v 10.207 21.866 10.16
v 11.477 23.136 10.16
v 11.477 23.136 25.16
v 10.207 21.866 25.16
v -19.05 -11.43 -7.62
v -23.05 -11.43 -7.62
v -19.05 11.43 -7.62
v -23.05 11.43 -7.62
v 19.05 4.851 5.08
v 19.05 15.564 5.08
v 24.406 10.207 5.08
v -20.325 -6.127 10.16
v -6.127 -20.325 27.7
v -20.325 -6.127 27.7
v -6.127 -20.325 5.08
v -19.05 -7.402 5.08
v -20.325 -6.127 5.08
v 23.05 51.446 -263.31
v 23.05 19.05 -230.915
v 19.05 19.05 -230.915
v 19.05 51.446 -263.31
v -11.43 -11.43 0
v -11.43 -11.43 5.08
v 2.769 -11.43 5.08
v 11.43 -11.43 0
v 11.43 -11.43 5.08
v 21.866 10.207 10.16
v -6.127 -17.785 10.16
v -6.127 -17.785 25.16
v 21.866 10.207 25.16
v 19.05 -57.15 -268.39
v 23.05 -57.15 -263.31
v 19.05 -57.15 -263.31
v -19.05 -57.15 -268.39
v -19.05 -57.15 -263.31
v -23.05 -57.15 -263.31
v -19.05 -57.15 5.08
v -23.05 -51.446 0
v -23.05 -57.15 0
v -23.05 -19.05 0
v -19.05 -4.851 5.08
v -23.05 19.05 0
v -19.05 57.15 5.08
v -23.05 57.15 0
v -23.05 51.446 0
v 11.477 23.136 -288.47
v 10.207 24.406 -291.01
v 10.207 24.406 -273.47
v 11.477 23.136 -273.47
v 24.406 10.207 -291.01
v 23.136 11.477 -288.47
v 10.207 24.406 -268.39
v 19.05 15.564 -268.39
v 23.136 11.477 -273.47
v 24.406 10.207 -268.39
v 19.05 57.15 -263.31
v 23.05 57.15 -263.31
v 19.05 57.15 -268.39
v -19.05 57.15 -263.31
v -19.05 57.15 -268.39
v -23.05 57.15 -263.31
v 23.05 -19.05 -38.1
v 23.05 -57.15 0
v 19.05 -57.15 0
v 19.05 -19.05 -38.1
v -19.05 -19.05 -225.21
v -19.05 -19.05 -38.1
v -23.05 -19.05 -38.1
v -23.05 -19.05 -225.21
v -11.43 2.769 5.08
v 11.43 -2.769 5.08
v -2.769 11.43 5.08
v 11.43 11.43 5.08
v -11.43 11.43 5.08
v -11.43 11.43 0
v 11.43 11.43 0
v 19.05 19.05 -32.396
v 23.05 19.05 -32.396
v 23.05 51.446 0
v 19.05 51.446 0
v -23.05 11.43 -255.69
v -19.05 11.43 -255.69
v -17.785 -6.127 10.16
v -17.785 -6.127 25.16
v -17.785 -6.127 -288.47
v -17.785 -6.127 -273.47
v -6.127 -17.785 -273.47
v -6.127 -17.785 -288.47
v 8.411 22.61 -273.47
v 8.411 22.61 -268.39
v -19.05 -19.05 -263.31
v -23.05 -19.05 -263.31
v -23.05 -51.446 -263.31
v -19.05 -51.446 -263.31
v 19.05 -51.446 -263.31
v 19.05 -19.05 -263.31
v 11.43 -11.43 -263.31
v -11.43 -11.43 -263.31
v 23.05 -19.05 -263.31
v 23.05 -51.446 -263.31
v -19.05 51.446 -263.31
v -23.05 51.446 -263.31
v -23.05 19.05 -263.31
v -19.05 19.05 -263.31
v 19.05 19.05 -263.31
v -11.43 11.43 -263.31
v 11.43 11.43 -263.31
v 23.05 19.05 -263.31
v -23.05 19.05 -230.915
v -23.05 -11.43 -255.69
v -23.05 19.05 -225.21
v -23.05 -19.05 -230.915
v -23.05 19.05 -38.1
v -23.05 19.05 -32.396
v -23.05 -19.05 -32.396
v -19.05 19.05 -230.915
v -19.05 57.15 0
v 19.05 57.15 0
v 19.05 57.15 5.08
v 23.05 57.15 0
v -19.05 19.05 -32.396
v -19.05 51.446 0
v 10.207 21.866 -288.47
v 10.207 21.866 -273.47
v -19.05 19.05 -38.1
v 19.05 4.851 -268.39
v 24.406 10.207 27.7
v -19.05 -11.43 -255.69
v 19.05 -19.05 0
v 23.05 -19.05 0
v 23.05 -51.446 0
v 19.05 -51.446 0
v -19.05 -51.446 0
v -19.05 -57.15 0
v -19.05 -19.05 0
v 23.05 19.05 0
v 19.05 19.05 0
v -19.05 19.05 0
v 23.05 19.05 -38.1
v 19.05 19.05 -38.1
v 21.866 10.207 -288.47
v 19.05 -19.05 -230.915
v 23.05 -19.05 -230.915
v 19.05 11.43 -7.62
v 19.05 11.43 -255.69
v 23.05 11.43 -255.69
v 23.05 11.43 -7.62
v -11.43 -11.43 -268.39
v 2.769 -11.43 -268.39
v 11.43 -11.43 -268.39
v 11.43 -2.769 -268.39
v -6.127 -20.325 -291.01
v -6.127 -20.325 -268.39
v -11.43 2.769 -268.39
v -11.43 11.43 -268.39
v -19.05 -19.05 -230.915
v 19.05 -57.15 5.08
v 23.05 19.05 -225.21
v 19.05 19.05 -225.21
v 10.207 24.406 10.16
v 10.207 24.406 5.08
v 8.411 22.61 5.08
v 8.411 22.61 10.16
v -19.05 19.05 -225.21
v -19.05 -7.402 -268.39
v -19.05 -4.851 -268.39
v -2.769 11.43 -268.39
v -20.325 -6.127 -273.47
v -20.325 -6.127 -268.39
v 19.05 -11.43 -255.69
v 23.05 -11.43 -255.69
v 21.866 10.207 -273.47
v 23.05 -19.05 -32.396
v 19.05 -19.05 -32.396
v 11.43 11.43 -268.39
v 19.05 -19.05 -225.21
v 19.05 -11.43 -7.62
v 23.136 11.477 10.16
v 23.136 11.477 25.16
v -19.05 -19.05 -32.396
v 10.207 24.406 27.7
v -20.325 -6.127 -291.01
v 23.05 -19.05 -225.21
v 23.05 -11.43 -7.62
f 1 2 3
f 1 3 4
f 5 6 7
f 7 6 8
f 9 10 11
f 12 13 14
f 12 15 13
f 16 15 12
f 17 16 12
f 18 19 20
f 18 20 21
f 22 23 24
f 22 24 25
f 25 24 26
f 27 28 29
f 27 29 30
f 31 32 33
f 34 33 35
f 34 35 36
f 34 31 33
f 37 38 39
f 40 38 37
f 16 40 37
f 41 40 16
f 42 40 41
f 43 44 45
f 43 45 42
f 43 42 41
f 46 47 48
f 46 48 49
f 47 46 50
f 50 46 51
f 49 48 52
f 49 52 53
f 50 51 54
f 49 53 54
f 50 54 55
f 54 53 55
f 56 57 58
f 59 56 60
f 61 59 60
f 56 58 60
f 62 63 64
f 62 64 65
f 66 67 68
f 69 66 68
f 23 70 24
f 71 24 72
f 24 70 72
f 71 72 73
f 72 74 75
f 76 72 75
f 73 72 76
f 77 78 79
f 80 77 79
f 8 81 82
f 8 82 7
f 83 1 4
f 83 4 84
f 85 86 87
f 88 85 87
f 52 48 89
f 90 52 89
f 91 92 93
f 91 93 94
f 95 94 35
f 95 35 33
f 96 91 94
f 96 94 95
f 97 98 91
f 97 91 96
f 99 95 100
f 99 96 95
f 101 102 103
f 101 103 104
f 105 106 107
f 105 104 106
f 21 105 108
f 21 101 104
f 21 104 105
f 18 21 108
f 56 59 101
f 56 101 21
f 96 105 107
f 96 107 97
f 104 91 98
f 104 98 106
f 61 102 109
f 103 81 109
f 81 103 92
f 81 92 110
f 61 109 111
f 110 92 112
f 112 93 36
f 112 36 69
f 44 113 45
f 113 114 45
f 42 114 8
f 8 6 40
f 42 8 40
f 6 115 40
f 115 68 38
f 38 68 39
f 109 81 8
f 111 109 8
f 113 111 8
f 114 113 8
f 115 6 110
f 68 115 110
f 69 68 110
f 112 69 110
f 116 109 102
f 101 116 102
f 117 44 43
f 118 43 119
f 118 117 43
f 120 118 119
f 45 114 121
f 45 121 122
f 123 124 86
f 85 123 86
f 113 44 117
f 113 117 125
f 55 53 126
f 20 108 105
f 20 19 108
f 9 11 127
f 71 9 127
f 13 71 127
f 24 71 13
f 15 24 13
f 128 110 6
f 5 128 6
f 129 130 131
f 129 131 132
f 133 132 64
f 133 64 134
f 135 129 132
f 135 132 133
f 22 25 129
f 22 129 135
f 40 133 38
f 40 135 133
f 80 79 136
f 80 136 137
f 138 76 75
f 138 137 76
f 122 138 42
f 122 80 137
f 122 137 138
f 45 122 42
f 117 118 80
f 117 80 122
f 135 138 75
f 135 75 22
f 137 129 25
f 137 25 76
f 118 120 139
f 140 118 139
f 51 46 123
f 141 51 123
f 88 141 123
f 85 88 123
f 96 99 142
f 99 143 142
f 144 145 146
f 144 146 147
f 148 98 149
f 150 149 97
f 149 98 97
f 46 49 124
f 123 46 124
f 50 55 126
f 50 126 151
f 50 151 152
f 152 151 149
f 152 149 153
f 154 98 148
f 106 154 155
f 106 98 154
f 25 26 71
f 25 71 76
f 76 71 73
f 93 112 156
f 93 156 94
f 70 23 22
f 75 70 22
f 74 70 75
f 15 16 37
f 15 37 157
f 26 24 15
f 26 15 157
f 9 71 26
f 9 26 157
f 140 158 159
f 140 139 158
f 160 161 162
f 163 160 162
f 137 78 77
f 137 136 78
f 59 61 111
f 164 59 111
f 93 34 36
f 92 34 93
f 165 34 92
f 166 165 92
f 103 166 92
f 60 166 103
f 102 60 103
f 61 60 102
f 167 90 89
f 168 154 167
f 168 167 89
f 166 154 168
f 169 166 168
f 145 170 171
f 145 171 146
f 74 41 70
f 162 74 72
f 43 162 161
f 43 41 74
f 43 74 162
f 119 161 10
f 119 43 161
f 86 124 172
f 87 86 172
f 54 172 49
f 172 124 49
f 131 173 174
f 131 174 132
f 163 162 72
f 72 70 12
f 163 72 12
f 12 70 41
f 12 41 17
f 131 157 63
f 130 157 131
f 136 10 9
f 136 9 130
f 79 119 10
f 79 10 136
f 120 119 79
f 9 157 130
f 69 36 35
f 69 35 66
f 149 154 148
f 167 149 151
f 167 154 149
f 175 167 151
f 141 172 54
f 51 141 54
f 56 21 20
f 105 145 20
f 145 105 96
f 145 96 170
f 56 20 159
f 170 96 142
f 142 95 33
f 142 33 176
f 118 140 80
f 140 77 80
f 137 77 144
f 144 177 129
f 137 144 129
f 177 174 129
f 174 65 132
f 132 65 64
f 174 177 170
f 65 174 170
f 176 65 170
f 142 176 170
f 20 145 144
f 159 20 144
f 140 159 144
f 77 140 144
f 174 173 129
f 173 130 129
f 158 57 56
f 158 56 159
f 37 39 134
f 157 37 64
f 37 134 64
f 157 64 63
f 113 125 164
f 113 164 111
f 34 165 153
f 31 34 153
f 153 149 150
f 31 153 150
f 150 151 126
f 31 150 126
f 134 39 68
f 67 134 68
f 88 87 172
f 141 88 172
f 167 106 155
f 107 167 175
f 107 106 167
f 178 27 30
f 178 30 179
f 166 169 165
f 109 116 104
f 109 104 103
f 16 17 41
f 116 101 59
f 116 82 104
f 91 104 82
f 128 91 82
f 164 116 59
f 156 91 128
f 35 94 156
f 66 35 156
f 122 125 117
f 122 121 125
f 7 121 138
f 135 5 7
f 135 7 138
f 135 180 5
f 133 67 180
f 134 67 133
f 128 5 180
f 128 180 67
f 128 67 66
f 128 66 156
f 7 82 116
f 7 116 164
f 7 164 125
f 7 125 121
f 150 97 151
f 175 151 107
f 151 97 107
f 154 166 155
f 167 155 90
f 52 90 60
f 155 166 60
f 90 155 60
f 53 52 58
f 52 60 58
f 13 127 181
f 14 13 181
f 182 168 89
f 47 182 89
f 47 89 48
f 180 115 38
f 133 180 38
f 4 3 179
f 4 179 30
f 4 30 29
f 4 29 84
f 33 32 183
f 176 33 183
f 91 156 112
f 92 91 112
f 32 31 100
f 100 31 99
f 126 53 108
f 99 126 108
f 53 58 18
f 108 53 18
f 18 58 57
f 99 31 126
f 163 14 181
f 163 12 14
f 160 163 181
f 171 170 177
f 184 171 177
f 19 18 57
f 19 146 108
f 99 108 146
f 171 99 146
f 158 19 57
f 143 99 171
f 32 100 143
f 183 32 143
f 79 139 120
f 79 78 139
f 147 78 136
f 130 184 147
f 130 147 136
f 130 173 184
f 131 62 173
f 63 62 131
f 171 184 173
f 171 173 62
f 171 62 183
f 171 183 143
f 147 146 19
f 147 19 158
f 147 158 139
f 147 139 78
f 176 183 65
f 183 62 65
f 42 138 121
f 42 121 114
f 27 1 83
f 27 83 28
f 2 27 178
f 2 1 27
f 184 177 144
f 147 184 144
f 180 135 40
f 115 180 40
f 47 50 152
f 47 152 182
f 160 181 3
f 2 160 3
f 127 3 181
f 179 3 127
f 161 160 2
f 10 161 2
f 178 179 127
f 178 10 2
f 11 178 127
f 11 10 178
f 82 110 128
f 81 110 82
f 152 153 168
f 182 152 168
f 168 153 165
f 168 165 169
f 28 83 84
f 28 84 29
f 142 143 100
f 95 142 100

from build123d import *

# Parameters (mm, degrees)
SKETCH1_W             = 38.1
SKETCH1_H             = 38.1
BOSS_EXTRUDE1_DEPTH   = 5.08
SKETCH2_W             = 4
SKETCH2_H             = 38.1
BOSS_EXTRUDE2_DEPTH   = 263.31036223
BOSS_EXTRUDE2_2_DEPTH = 263.31036223
BOSS_EXTRUDE4_DEPTH   = 38.1
SKETCH5_W             = 22.86
SKETCH5_H             = 22.86
CUT_EXTRUDE1_DEPTH    = 354.24236223
SKETCH6_W             = 248.07036223
SKETCH6_H             = 22.86
CUT_EXTRUDE2_DEPTH    = 354.24236223
BOSS_EXTRUDE5_DEPTH   = 38.1
BOSS_EXTRUDE6_DEPTH   = 4
MIRROR9_COPY_1_DEPTH  = 4
BOSS_EXTRUDE8_DEPTH   = 5.08
BOSS_EXTRUDE9_DEPTH   = 15
BOSS_EXTRUDE10_DEPTH  = 2.54


with BuildPart() as part:
    # Sketch1 → Boss-Extrude1 (new body)
    with BuildSketch(Plane.XY):
        Rectangle(SKETCH1_W, SKETCH1_H)
    extrude(amount=BOSS_EXTRUDE1_DEPTH)



with BuildPart() as body_2:
    # Sketch2 → Boss-Extrude2 (new body)
    with BuildSketch(Plane(origin=(0, 0, 0), x_dir=(-1, 0, 0), z_dir=(0, 0, -1))):
        with Locations((21.05, 0)):
            Rectangle(SKETCH2_W, SKETCH2_H)
    extrude(amount=BOSS_EXTRUDE2_DEPTH)


with BuildPart() as body_3:
    # Sketch2 → Boss-Extrude2 2 (new body)
    with BuildSketch(Plane(origin=(0, 0, 0), x_dir=(-1, 0, 0), z_dir=(0, 0, -1))):
        with Locations((-21.05, 0)):
            Rectangle(SKETCH2_W, SKETCH2_H)
    extrude(amount=BOSS_EXTRUDE2_2_DEPTH)


with BuildPart() as part_1:
    add(part.part)

    add(body_2.part)  # Boss-Extrude4 merges body 2

    add(body_3.part)  # Boss-Extrude4 merges body 3
    # Sketch4 → Boss-Extrude4 (add)
    with BuildSketch(Plane(origin=(0, 19.05, 0), x_dir=(1, 0, 0), z_dir=(0, 1, 0))):
        Polygon((23.05, 0), (19.05, -5.08), (19.05, 0), align=None)
        Polygon((-19.05, 0), (-19.05, -5.08), (-23.05, 0), align=None)
    extrude(amount=-BOSS_EXTRUDE4_DEPTH)

    # Mirror2: part across plane


with BuildPart() as part_2:
    add(part_1.part)
    add(part_1.part.mirror(Plane(origin=(0, 0, -131.655181115), x_dir=(1, 0, 0), z_dir=(0, 0, -1))))

    # Sketch5 → Cut-Extrude1 (cut)
    with BuildSketch(Plane.XY.offset(5.08)):
        Rectangle(SKETCH5_W, SKETCH5_H)
    extrude(amount=-CUT_EXTRUDE1_DEPTH, mode=Mode.SUBTRACT)

    # Sketch6 → Cut-Extrude2 (cut)
    with BuildSketch(Plane.ZY.offset(23.05)):
        with Locations((-131.655181115, 0)):
            Rectangle(SKETCH6_W, SKETCH6_H)
    extrude(amount=-CUT_EXTRUDE2_DEPTH, mode=Mode.SUBTRACT)

    # Sketch7 → Boss-Extrude5 (add)
    with BuildSketch(Plane(origin=(0, 19.05, 0), x_dir=(1, 0, 0), z_dir=(0, 1, 0))):
        Polygon((-19.05, 0), (-23.05, 0), (-19.05, -5.08), (19.05, -5.08), (23.05, 0), (19.05, 0), align=None)
        Polygon((19.05, 268.39036223), (23.05, 263.31036223), (19.05, 263.31036223), (-19.05, 263.31036223), (-23.05, 263.31036223), (-19.05, 268.39036223), align=None)
    boss_extrude5 = extrude(amount=BOSS_EXTRUDE5_DEPTH)

    # Sketch8 → Boss-Extrude6 (add)
    with BuildSketch(Plane.ZY.offset(23.05)):
        Polygon((0, 57.15), (-38.1, 19.05), (-32.395584898, 19.05), (0, 51.445584898), align=None)
        Polygon((-230.914777332, 19.05), (-263.31036223, 51.445584898), (-263.31036223, 57.15), (-225.21036223, 19.05), align=None)
    boss_extrude6 = extrude(amount=-BOSS_EXTRUDE6_DEPTH)

    # Mirror8: Boss-Extrude6 across plane
    add(boss_extrude6.mirror(Plane(origin=(0, 0, 0), x_dir=(0, 0, 1), z_dir=(1, 0, 0))))

    # Mirror9: Boss-Extrude5, Boss-Extrude6 across plane
    add(boss_extrude5.mirror(Plane.ZX))
    add(boss_extrude6.mirror(Plane.ZX))

    # Mirror9 copy 1 sketch → Mirror9 copy 1 (add)
    with BuildSketch(Plane(origin=(23.05, 0, 0), x_dir=(0, 0, 1), z_dir=(1, 0, 0))):
        Polygon((0, 57.15), (-38.1, 19.05), (-32.395584898, 19.05), (0, 51.445584898), align=None)
        Polygon((-230.914777332, 19.05), (-263.31036223, 51.445584898), (-263.31036223, 57.15), (-225.21036223, 19.05), align=None)
    extrude(amount=-MIRROR9_COPY_1_DEPTH)

    # Sketch11 → Boss-Extrude8 (add)
    with BuildSketch(Plane.XY.offset(5.08)):
        Polygon((-18.529352083, -7.922750365), (-7.922750365, -18.529352083), (-6.126699141, -20.325403307), (24.406171671, 10.207467504), (10.207467504, 24.406171671), (8.41141628, 22.610120446), (-20.325403307, -6.126699141), align=None)
    boss_extrude8 = extrude(amount=BOSS_EXTRUDE8_DEPTH)

    # Sketch12 → Boss-Extrude9 (add)
    with BuildSketch(Plane.XY.offset(10.16)):
        Polygon((24.406171671, 10.207467504), (-6.126699141, -20.325403307), (-20.325403307, -6.126699141), (10.207467504, 24.406171671), (11.477467504, 23.136171671), (10.207467504, 21.866171671), (-17.785403307, -6.126699141), (-6.126699141, -17.785403307), (21.866171671, 10.207467504), (23.136171671, 11.477467504), align=None)
    boss_extrude9 = extrude(amount=BOSS_EXTRUDE9_DEPTH)

    # Sketch13 → Boss-Extrude10 (add)
    with BuildSketch(Plane.XY.offset(25.16)):
        Polygon((-20.325403307, -6.126699141), (10.207467504, 24.406171671), (24.406171671, 10.207467504), (-6.126699141, -20.325403307), align=None)
    boss_extrude10 = extrude(amount=BOSS_EXTRUDE10_DEPTH)

    # Mirror12: Boss-Extrude8, Boss-Extrude9, Boss-Extrude10 across plane
    add(boss_extrude8.mirror(Plane(origin=(0, 0, -131.655181115), x_dir=(1, 0, 0), z_dir=(0, 0, -1))))
    add(boss_extrude9.mirror(Plane(origin=(0, 0, -131.655181115), x_dir=(1, 0, 0), z_dir=(0, 0, -1))))
    add(boss_extrude10.mirror(Plane(origin=(0, 0, -131.655181115), x_dir=(1, 0, 0), z_dir=(0, 0, -1))))


solid = part_2.part
